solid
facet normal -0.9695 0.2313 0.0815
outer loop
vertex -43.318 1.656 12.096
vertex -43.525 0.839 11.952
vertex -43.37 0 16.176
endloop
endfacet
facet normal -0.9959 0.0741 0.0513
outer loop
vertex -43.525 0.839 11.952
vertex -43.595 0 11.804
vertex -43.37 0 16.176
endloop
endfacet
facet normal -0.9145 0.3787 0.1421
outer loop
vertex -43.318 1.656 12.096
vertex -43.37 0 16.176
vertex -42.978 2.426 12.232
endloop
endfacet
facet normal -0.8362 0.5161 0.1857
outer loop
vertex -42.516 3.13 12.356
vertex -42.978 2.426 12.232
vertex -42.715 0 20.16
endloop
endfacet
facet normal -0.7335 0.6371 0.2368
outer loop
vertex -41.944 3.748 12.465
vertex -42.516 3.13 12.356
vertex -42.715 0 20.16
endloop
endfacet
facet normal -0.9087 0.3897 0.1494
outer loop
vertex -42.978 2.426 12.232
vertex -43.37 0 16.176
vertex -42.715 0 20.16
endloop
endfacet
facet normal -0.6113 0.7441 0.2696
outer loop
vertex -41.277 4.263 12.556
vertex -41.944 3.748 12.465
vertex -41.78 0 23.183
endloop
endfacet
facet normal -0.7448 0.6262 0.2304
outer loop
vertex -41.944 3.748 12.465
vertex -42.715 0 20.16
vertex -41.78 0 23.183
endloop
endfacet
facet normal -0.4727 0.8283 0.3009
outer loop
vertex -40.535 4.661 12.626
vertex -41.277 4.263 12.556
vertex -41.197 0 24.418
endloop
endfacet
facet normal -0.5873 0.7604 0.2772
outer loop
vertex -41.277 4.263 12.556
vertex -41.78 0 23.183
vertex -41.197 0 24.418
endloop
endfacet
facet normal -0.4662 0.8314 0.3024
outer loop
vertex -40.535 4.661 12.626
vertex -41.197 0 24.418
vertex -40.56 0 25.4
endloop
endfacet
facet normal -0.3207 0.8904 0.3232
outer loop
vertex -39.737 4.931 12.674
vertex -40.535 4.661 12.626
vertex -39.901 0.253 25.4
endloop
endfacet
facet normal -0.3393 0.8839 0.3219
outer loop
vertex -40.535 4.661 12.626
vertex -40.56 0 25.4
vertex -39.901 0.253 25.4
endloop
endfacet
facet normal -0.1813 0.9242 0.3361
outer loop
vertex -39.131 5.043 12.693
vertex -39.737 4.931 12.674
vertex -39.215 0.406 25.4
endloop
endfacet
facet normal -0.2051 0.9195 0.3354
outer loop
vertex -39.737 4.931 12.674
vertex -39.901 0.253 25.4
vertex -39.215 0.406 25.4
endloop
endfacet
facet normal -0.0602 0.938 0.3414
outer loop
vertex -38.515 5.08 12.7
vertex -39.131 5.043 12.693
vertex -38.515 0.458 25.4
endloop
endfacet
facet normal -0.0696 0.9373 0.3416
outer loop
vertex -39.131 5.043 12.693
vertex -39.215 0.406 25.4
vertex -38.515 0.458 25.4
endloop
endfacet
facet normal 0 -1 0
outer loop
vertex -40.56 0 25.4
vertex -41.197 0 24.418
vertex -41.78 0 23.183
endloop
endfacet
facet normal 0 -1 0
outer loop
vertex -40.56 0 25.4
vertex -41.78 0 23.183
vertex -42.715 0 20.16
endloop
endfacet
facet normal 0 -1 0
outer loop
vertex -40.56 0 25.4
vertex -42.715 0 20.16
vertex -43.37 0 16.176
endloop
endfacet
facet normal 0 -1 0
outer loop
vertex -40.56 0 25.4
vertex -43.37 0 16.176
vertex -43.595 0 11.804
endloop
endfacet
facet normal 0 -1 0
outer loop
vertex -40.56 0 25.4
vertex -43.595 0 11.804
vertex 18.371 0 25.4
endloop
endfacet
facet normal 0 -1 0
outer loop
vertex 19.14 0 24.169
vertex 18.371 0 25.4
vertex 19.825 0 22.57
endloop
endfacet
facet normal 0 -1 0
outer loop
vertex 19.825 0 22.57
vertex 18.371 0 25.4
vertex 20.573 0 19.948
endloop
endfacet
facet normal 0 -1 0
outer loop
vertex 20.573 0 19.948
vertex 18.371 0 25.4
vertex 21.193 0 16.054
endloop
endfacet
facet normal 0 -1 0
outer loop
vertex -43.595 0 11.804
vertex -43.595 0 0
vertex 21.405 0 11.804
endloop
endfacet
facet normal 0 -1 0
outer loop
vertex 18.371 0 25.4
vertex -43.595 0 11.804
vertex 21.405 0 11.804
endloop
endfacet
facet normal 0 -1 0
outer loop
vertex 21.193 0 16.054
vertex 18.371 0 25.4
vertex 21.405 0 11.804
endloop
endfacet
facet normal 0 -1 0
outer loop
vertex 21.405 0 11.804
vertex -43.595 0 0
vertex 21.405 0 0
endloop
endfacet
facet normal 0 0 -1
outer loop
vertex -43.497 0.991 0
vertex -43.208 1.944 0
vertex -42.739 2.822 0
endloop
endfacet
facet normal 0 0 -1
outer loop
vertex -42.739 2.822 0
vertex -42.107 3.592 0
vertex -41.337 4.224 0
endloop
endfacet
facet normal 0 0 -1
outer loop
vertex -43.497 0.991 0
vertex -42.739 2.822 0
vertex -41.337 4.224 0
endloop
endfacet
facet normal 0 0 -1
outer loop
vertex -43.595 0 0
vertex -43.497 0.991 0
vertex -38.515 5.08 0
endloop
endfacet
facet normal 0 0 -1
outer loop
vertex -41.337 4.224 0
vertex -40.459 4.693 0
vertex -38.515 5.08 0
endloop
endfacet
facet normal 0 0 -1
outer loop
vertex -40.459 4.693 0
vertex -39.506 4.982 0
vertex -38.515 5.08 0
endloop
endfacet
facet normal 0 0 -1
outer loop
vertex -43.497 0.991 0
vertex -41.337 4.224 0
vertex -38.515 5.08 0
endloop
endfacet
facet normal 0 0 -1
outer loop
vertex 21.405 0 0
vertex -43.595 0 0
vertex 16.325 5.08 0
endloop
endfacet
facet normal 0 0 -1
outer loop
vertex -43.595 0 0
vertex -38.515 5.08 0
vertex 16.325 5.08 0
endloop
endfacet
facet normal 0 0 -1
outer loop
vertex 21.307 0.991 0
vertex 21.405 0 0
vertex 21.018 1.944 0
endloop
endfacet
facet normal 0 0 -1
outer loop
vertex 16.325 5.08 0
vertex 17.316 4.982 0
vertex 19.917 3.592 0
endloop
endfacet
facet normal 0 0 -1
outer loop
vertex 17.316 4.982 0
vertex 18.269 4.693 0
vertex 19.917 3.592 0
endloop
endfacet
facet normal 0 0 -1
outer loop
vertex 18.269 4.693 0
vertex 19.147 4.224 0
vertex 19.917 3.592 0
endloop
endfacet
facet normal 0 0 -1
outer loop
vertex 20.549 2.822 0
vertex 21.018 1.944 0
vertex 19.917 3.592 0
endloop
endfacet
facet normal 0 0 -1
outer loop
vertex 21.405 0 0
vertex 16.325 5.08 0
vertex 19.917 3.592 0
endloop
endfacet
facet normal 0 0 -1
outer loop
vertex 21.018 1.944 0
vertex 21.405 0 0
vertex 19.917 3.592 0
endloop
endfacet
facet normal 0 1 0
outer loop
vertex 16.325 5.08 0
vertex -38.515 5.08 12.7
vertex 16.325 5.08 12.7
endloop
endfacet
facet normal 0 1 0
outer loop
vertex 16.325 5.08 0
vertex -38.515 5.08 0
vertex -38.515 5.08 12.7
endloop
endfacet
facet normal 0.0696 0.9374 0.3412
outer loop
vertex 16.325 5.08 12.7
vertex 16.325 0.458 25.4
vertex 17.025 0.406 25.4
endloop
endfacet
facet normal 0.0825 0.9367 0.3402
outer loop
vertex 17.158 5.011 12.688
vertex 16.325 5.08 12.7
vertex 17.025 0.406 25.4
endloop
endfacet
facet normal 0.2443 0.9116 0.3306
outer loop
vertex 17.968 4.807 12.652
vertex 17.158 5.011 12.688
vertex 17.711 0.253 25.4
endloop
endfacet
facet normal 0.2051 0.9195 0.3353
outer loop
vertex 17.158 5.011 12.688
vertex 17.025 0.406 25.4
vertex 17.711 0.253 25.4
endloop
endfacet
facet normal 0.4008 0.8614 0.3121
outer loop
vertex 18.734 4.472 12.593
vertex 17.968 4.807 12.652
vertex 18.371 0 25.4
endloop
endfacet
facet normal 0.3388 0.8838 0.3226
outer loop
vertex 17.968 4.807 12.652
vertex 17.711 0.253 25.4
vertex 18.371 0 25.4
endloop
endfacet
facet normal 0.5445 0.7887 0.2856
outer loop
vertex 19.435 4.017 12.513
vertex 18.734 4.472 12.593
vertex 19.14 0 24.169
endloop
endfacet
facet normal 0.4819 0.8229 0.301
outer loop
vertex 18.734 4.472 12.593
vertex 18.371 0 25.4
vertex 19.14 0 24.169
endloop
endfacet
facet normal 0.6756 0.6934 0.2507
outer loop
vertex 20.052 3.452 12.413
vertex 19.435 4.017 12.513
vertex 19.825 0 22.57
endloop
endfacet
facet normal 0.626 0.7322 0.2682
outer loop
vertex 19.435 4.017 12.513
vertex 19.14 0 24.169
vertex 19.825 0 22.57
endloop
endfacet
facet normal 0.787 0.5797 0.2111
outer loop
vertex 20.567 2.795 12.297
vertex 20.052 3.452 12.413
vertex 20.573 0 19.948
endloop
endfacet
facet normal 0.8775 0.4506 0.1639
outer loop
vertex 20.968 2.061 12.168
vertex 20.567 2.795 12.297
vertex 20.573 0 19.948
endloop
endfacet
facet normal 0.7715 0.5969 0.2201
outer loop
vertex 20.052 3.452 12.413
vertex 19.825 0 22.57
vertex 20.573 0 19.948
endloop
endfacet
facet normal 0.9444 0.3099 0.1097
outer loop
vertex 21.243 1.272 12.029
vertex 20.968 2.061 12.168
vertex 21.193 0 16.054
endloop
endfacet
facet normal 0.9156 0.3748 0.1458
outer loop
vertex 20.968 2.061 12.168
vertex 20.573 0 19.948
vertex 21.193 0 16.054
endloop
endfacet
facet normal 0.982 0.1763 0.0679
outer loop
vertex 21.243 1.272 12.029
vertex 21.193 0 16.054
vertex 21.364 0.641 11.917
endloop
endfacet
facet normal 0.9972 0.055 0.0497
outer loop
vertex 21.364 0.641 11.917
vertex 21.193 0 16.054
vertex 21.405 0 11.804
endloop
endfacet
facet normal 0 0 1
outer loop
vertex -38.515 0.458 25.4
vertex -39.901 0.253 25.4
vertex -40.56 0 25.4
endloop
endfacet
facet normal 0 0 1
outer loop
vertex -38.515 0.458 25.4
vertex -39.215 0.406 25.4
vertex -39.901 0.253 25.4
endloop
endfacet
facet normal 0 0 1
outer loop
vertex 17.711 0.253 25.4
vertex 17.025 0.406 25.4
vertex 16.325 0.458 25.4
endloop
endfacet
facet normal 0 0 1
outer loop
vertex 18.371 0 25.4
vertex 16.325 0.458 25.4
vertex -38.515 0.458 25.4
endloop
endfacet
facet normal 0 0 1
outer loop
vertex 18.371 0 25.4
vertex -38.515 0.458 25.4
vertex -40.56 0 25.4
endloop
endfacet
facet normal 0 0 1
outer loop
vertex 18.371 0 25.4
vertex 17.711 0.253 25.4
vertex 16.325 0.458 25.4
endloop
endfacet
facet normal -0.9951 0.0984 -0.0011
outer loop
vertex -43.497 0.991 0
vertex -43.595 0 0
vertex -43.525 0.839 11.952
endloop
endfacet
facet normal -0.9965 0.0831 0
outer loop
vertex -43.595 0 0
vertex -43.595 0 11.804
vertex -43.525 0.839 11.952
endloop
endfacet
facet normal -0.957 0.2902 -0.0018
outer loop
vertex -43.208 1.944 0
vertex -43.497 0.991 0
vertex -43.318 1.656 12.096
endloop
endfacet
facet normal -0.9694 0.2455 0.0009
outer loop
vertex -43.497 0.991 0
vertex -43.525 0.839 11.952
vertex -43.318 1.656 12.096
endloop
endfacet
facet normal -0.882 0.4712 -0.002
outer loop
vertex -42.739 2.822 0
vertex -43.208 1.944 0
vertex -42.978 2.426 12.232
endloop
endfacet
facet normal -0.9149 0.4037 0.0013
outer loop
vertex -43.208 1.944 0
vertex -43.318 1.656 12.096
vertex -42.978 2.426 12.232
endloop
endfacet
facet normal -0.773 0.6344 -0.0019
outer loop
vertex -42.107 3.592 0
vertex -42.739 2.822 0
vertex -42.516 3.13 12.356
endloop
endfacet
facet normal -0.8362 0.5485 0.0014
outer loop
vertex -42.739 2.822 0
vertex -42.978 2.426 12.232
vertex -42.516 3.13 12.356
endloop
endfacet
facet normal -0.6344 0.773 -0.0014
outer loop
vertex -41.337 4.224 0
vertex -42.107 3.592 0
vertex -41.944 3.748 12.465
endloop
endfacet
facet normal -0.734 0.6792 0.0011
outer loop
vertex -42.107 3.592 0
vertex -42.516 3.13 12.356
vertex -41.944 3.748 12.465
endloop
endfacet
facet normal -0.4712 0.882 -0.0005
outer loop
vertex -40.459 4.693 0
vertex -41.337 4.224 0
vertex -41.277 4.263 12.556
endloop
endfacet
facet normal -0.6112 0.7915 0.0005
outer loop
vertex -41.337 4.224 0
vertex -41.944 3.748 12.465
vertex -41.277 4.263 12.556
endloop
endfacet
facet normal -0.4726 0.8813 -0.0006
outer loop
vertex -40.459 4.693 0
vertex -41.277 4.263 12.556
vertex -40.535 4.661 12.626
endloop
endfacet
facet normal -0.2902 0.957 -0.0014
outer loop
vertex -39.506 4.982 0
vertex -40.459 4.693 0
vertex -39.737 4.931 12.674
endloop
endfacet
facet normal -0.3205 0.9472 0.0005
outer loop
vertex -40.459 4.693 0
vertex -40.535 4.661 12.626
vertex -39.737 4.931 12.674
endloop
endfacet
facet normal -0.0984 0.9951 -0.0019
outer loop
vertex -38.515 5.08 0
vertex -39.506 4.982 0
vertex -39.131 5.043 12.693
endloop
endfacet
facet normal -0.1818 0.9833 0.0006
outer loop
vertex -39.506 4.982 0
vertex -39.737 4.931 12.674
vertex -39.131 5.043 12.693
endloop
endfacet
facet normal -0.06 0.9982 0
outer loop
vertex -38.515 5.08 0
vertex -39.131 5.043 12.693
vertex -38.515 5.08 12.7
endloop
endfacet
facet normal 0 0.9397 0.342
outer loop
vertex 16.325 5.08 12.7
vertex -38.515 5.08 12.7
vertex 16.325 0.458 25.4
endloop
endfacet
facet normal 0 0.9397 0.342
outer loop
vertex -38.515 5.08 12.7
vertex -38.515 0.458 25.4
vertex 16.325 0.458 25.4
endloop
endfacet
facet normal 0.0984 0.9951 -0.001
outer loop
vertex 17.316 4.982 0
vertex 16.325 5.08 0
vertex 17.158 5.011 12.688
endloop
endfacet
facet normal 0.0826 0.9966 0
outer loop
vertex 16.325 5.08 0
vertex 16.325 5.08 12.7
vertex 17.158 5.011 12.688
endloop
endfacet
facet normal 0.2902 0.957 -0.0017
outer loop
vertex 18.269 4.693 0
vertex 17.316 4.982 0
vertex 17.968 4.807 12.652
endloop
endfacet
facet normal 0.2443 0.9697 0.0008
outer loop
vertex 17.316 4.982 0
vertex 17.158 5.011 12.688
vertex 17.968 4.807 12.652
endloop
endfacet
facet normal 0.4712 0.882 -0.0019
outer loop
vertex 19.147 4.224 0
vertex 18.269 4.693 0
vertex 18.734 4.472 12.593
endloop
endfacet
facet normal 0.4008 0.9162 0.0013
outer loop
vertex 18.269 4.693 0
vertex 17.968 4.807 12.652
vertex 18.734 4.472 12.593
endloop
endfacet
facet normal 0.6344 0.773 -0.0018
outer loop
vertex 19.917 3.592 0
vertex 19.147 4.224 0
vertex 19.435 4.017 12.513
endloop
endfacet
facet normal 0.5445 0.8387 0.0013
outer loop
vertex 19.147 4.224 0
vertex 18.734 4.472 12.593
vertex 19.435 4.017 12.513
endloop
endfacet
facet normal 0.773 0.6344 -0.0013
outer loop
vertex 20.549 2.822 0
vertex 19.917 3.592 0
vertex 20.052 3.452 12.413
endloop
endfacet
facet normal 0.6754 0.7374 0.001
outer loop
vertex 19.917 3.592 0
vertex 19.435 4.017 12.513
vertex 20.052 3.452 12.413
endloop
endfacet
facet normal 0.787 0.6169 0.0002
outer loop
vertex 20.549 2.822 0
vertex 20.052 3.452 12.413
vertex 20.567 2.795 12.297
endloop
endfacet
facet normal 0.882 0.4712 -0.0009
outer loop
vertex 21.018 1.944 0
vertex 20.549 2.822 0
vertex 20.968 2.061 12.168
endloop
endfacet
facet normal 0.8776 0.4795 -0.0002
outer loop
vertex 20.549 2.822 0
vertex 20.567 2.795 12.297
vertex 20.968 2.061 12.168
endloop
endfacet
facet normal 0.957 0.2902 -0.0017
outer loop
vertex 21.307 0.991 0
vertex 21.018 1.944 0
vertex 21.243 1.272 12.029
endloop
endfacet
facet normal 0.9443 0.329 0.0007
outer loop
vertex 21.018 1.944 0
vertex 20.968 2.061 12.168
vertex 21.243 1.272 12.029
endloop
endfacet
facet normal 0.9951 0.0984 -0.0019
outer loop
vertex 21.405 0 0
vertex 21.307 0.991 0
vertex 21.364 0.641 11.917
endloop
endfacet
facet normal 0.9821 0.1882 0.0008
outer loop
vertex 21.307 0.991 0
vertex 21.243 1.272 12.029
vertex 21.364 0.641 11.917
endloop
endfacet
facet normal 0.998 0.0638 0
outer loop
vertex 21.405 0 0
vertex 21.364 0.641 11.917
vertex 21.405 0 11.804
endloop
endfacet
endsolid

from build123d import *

# Parameters (mm, degrees)
F0_W     = 65.000124
F0_H     = 5.08
F1_DEPTH = 25.4
F2_SIZE2 = 4.6224219752
F2_SIZE  = 12.7
F3_R     = 5.07999


# Not quite as in the source:
# - a fillet or chamfer is up to 0.001 mm smaller than in the source, because OpenCascade refuses the exact size


with BuildPart() as f1:
    # F0 (on Top) → F1 (new body)
    with BuildSketch(Plane.XY):
        with Locations((-11.0949875303, 2.54)):
            Rectangle(F0_W, F0_H)
    extrude(amount=F1_DEPTH)

    # F2
    f2_edges = [f1.edges().sort_by_distance(p)[0] for p in [
        (-11.094988, 5.08, 25.4),
    ]]
    f2_side = f1.faces().sort_by_distance((-11.094988, 5.08, 12.7))[0]
    chamfer(f2_edges, length=F2_SIZE, length2=F2_SIZE2, reference=f2_side)

    # F3 (radius 5.08 in the source; OpenCascade refuses exactly that, so slightly less here)
    f3_edges = [f1.edges().sort_by_distance(p)[0] for p in [
        (21.405074, 2.768789, 19.05),
        (21.405074, 5.08, 6.35),
        (-43.59505, 5.08, 6.35),
        (-43.59505, 2.768789, 19.05),
    ]]
    fillet(f3_edges, radius=F3_R)


solid = f1.part
